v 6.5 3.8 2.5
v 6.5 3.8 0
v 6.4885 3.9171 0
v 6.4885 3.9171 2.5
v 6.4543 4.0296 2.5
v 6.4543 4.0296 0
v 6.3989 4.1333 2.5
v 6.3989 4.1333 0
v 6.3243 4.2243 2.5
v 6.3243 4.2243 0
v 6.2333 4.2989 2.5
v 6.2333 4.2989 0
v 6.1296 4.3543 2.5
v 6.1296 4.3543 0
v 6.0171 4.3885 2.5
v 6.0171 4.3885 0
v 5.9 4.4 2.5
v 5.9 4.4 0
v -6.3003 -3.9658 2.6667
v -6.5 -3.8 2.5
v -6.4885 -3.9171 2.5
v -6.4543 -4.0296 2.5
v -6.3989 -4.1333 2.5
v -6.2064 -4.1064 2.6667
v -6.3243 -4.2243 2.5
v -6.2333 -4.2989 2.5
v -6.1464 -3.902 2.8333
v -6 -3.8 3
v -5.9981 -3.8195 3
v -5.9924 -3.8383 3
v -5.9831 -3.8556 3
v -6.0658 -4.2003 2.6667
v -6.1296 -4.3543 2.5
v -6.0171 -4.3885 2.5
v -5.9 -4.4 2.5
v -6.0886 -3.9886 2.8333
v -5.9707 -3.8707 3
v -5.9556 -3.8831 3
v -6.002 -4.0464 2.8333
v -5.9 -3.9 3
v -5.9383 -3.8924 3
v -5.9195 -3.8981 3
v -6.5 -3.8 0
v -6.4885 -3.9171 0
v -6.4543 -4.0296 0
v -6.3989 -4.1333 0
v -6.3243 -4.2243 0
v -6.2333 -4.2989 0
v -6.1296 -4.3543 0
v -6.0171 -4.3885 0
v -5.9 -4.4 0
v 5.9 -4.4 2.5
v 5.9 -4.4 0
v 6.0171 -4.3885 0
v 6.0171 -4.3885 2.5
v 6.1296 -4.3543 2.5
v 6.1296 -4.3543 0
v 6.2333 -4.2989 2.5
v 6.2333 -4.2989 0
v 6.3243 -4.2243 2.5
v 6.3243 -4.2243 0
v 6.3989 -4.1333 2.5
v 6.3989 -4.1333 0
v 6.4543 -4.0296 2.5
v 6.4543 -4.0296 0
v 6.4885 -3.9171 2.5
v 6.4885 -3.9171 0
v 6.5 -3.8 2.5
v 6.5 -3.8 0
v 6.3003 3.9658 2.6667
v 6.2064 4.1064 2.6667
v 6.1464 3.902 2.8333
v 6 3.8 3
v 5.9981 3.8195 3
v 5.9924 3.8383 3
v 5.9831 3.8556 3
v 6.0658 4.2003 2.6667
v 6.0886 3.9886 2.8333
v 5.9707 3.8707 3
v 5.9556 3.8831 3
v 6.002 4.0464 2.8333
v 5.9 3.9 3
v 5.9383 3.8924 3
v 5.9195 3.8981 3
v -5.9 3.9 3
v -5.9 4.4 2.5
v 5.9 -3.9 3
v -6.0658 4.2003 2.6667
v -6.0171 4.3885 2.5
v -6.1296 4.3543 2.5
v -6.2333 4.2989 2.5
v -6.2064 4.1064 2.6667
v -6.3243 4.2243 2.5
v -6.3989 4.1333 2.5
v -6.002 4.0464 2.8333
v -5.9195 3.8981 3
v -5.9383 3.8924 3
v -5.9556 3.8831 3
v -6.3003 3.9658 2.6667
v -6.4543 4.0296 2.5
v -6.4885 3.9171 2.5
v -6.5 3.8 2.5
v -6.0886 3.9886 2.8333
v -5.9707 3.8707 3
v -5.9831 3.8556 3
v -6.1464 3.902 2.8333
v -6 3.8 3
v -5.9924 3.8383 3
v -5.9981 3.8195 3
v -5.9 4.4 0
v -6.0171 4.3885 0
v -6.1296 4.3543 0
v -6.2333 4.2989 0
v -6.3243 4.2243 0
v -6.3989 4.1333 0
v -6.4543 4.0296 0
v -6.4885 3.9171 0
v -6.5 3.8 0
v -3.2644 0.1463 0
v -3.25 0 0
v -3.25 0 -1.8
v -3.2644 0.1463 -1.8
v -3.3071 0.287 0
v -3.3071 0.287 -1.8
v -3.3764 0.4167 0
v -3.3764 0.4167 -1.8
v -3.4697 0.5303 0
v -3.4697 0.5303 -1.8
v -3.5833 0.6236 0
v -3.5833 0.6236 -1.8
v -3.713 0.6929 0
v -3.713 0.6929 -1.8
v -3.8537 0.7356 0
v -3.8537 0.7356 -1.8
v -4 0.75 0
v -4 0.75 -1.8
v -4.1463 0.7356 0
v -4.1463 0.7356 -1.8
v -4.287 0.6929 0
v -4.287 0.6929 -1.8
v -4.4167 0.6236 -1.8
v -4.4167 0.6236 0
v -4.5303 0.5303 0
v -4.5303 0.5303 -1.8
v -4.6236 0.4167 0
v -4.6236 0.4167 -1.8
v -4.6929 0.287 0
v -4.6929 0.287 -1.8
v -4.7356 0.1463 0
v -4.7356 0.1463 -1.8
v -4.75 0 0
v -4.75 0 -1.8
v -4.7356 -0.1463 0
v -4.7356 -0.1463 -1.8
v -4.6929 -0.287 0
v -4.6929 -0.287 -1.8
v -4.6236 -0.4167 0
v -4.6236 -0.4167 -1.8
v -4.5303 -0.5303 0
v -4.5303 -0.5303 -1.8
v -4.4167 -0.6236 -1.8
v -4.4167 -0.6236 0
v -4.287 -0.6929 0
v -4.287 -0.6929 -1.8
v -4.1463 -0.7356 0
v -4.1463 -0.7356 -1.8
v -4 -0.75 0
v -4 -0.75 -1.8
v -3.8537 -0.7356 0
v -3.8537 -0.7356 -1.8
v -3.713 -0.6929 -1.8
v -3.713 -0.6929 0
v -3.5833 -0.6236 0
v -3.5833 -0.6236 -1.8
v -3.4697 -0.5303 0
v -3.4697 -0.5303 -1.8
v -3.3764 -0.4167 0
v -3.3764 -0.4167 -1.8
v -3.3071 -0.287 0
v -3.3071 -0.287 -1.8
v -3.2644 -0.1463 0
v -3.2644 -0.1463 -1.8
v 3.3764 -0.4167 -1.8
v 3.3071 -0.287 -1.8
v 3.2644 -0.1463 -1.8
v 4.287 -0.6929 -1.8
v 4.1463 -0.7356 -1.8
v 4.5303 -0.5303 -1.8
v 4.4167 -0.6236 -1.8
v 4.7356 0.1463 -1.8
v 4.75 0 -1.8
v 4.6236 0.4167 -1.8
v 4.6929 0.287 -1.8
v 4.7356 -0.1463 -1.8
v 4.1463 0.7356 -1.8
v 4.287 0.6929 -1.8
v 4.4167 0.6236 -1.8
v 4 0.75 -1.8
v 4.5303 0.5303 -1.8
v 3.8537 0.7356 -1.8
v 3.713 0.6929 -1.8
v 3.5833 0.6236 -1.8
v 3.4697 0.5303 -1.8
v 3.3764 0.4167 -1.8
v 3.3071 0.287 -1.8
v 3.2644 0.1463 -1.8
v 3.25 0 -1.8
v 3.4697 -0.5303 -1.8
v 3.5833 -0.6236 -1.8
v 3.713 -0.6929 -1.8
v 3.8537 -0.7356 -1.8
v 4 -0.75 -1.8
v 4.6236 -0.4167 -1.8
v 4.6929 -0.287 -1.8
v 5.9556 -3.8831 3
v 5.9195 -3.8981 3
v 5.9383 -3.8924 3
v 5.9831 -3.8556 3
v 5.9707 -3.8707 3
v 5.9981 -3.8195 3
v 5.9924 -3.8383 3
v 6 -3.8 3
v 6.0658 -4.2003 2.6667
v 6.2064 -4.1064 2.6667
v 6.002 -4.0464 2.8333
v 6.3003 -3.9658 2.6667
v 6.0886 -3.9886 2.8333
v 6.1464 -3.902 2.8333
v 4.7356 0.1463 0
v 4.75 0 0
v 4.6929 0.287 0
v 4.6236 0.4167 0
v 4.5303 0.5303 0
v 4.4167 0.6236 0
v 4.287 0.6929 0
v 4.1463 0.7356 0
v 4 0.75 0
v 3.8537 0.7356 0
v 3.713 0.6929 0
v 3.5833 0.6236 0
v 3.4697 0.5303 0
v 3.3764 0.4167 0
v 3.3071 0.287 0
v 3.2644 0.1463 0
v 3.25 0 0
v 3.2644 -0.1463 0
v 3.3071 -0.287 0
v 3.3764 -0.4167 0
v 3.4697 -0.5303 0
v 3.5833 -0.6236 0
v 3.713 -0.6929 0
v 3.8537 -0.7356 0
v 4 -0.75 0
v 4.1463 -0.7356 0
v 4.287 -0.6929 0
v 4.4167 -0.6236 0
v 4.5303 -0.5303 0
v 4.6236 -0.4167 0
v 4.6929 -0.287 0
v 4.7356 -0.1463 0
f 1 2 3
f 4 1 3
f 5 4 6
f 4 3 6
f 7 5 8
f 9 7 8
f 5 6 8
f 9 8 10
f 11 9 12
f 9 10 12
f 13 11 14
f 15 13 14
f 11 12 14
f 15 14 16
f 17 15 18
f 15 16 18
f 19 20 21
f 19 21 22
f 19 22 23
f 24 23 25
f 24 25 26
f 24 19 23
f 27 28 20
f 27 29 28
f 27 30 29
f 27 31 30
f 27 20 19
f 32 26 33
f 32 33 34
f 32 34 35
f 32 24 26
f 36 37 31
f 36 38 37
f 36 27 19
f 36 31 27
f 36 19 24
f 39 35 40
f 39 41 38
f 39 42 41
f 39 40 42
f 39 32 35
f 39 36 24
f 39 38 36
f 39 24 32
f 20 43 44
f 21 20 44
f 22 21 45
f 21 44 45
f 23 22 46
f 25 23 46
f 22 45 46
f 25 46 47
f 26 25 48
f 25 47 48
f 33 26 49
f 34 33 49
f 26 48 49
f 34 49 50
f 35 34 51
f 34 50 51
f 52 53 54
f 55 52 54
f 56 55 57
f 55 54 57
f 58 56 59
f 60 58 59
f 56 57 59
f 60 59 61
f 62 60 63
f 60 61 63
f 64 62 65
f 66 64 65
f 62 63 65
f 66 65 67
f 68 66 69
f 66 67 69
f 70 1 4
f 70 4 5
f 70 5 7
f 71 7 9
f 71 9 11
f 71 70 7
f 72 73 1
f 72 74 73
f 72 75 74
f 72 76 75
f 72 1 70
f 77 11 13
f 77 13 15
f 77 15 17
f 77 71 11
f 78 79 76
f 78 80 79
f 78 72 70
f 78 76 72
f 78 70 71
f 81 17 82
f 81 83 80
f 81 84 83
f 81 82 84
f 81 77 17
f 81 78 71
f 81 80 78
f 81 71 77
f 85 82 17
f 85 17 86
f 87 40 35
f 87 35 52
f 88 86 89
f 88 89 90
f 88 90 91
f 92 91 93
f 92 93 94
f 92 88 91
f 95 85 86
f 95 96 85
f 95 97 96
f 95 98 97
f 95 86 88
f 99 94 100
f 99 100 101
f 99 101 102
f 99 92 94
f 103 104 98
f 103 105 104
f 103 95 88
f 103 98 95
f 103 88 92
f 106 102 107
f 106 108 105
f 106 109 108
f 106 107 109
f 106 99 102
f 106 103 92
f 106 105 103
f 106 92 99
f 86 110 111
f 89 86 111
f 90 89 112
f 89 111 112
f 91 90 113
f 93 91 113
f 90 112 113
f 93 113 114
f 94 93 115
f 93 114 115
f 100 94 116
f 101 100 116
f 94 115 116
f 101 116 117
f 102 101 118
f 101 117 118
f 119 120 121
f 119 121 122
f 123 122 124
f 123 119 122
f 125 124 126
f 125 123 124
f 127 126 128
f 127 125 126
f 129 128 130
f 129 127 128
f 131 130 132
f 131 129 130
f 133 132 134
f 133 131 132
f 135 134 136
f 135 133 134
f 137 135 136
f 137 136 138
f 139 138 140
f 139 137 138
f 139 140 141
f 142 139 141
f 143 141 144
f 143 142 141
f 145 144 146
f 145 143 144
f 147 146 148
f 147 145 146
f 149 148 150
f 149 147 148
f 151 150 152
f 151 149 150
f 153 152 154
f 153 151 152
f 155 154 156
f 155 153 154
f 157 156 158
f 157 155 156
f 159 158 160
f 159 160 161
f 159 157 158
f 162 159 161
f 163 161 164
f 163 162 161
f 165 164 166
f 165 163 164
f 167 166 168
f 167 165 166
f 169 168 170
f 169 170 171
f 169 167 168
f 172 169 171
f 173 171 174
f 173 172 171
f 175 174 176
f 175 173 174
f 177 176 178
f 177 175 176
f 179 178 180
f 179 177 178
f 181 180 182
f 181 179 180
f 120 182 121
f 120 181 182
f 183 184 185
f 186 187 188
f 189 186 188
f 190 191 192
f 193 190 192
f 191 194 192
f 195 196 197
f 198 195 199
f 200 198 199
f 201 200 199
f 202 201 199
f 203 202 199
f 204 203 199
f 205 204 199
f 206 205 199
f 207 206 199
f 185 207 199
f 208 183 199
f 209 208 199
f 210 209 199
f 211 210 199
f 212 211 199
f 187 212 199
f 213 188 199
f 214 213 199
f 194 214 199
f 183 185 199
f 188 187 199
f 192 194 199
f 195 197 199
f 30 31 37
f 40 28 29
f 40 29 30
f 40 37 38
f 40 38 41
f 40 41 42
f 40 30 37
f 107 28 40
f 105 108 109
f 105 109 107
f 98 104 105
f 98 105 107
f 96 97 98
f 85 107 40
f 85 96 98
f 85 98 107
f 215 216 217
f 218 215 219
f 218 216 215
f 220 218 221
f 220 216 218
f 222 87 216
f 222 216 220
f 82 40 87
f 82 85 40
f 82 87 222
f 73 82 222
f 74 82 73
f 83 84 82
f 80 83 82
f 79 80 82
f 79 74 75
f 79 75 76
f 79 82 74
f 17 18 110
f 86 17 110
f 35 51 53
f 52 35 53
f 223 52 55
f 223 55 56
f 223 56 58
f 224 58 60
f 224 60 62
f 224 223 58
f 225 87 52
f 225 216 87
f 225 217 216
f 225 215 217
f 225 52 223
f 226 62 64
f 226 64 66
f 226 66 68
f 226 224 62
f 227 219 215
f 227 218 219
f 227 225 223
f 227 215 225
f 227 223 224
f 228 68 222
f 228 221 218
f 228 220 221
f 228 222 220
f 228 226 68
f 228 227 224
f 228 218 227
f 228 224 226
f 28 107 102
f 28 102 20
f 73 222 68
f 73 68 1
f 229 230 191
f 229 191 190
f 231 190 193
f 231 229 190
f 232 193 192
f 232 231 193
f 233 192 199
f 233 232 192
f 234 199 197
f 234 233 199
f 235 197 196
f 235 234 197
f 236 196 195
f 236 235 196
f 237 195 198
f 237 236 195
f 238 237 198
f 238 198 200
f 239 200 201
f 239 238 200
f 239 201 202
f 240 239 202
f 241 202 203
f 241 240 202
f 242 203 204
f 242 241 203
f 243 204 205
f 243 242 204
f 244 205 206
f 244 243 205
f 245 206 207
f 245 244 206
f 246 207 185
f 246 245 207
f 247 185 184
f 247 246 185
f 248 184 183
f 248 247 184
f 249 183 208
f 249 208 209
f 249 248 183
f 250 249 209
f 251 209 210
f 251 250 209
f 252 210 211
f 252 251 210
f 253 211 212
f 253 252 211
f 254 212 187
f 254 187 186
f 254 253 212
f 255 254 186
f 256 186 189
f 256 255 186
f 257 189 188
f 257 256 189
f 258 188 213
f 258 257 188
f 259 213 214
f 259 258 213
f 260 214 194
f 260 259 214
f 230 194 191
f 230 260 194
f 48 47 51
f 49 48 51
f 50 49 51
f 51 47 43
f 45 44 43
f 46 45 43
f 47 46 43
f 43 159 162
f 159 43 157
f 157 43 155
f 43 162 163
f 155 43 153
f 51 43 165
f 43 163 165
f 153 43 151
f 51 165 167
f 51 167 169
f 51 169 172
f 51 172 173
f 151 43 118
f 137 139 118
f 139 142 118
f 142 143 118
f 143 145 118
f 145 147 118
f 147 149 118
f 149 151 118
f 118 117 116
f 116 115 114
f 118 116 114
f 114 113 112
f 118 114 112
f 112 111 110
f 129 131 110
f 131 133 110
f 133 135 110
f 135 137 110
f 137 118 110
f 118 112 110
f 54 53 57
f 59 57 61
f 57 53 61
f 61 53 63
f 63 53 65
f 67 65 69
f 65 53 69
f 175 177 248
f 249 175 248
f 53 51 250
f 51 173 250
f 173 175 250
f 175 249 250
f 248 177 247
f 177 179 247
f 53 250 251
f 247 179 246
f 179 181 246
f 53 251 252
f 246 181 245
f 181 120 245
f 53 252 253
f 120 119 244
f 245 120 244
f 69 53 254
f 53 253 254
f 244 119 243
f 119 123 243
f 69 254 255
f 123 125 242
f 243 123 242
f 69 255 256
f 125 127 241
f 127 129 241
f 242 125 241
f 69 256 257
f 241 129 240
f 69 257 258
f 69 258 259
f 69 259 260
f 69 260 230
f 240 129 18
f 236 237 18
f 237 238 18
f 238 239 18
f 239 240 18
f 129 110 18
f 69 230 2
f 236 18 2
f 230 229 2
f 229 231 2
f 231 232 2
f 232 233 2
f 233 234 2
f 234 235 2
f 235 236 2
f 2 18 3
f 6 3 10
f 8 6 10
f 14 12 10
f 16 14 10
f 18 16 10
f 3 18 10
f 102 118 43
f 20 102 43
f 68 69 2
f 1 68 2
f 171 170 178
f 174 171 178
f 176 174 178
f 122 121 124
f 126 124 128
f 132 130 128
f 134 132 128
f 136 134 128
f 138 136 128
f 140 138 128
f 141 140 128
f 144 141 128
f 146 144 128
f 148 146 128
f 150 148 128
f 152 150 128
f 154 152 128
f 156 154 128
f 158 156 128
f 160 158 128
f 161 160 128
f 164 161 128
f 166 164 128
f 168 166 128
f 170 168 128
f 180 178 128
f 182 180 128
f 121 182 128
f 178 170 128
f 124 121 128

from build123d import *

# Parameters (mm, degrees)
COVER_FEATURE11_13X8_8_R0_6_H1_5_DEPTH    = 3
SKETCH_5_R                                = 0.75
LOCATING_PINS_D1_5_PITCH8_LENGTH1_8_DEPTH = 1.8
CHAMFER_1_SIZE                            = 0.5


with BuildPart() as part:
    # 草图4 → Cover_feature11_13x8.8_R0.6_H1.5 (new body)
    with BuildSketch(Plane.XY):
        with BuildLine():
            Line((-5.9, -4.4), (5.9, -4.4))
            ThreePointArc((5.9, -4.4), (6.324264069, -4.224264069), (6.5, -3.8))
            Line((6.5, -3.8), (6.5, 3.8))
            ThreePointArc((6.5, 3.8), (6.324264069, 4.224264069), (5.9, 4.4))
            Line((5.9, 4.4), (-5.9, 4.4))
            ThreePointArc((-5.9, 4.4), (-6.324264069, 4.224264069), (-6.5, 3.8))
            Line((-6.5, 3.8), (-6.5, -3.8))
            ThreePointArc((-6.5, -3.8), (-6.324264069, -4.224264069), (-5.9, -4.4))
        make_face()
    extrude(amount=COVER_FEATURE11_13X8_8_R0_6_H1_5_DEPTH)

    # 草图5 → Locating_pins_D1.5_pitch8_length1.8 (add)
    with BuildSketch(Plane.XY):
        with Locations((-4, 0)):
            Circle(SKETCH_5_R)
        with Locations((4, 0)):
            Circle(SKETCH_5_R)
    extrude(amount=-LOCATING_PINS_D1_5_PITCH8_LENGTH1_8_DEPTH)

    # 倒角1
    chamfer_1_edges = [part.edges().sort_by_distance(p)[0] for p in [
        (6.324264069, -4.224264069, 3),
        (6.5, 0, 3),
        (6.324264069, 4.224264069, 3),
        (0, 4.4, 3),
        (-6.324264069, 4.224264069, 3),
        (-6.5, 0, 3),
        (-6.324264069, -4.224264069, 3),
        (0, -4.4, 3),
    ]]
    chamfer(chamfer_1_edges, length=CHAMFER_1_SIZE)


solid = part.part
